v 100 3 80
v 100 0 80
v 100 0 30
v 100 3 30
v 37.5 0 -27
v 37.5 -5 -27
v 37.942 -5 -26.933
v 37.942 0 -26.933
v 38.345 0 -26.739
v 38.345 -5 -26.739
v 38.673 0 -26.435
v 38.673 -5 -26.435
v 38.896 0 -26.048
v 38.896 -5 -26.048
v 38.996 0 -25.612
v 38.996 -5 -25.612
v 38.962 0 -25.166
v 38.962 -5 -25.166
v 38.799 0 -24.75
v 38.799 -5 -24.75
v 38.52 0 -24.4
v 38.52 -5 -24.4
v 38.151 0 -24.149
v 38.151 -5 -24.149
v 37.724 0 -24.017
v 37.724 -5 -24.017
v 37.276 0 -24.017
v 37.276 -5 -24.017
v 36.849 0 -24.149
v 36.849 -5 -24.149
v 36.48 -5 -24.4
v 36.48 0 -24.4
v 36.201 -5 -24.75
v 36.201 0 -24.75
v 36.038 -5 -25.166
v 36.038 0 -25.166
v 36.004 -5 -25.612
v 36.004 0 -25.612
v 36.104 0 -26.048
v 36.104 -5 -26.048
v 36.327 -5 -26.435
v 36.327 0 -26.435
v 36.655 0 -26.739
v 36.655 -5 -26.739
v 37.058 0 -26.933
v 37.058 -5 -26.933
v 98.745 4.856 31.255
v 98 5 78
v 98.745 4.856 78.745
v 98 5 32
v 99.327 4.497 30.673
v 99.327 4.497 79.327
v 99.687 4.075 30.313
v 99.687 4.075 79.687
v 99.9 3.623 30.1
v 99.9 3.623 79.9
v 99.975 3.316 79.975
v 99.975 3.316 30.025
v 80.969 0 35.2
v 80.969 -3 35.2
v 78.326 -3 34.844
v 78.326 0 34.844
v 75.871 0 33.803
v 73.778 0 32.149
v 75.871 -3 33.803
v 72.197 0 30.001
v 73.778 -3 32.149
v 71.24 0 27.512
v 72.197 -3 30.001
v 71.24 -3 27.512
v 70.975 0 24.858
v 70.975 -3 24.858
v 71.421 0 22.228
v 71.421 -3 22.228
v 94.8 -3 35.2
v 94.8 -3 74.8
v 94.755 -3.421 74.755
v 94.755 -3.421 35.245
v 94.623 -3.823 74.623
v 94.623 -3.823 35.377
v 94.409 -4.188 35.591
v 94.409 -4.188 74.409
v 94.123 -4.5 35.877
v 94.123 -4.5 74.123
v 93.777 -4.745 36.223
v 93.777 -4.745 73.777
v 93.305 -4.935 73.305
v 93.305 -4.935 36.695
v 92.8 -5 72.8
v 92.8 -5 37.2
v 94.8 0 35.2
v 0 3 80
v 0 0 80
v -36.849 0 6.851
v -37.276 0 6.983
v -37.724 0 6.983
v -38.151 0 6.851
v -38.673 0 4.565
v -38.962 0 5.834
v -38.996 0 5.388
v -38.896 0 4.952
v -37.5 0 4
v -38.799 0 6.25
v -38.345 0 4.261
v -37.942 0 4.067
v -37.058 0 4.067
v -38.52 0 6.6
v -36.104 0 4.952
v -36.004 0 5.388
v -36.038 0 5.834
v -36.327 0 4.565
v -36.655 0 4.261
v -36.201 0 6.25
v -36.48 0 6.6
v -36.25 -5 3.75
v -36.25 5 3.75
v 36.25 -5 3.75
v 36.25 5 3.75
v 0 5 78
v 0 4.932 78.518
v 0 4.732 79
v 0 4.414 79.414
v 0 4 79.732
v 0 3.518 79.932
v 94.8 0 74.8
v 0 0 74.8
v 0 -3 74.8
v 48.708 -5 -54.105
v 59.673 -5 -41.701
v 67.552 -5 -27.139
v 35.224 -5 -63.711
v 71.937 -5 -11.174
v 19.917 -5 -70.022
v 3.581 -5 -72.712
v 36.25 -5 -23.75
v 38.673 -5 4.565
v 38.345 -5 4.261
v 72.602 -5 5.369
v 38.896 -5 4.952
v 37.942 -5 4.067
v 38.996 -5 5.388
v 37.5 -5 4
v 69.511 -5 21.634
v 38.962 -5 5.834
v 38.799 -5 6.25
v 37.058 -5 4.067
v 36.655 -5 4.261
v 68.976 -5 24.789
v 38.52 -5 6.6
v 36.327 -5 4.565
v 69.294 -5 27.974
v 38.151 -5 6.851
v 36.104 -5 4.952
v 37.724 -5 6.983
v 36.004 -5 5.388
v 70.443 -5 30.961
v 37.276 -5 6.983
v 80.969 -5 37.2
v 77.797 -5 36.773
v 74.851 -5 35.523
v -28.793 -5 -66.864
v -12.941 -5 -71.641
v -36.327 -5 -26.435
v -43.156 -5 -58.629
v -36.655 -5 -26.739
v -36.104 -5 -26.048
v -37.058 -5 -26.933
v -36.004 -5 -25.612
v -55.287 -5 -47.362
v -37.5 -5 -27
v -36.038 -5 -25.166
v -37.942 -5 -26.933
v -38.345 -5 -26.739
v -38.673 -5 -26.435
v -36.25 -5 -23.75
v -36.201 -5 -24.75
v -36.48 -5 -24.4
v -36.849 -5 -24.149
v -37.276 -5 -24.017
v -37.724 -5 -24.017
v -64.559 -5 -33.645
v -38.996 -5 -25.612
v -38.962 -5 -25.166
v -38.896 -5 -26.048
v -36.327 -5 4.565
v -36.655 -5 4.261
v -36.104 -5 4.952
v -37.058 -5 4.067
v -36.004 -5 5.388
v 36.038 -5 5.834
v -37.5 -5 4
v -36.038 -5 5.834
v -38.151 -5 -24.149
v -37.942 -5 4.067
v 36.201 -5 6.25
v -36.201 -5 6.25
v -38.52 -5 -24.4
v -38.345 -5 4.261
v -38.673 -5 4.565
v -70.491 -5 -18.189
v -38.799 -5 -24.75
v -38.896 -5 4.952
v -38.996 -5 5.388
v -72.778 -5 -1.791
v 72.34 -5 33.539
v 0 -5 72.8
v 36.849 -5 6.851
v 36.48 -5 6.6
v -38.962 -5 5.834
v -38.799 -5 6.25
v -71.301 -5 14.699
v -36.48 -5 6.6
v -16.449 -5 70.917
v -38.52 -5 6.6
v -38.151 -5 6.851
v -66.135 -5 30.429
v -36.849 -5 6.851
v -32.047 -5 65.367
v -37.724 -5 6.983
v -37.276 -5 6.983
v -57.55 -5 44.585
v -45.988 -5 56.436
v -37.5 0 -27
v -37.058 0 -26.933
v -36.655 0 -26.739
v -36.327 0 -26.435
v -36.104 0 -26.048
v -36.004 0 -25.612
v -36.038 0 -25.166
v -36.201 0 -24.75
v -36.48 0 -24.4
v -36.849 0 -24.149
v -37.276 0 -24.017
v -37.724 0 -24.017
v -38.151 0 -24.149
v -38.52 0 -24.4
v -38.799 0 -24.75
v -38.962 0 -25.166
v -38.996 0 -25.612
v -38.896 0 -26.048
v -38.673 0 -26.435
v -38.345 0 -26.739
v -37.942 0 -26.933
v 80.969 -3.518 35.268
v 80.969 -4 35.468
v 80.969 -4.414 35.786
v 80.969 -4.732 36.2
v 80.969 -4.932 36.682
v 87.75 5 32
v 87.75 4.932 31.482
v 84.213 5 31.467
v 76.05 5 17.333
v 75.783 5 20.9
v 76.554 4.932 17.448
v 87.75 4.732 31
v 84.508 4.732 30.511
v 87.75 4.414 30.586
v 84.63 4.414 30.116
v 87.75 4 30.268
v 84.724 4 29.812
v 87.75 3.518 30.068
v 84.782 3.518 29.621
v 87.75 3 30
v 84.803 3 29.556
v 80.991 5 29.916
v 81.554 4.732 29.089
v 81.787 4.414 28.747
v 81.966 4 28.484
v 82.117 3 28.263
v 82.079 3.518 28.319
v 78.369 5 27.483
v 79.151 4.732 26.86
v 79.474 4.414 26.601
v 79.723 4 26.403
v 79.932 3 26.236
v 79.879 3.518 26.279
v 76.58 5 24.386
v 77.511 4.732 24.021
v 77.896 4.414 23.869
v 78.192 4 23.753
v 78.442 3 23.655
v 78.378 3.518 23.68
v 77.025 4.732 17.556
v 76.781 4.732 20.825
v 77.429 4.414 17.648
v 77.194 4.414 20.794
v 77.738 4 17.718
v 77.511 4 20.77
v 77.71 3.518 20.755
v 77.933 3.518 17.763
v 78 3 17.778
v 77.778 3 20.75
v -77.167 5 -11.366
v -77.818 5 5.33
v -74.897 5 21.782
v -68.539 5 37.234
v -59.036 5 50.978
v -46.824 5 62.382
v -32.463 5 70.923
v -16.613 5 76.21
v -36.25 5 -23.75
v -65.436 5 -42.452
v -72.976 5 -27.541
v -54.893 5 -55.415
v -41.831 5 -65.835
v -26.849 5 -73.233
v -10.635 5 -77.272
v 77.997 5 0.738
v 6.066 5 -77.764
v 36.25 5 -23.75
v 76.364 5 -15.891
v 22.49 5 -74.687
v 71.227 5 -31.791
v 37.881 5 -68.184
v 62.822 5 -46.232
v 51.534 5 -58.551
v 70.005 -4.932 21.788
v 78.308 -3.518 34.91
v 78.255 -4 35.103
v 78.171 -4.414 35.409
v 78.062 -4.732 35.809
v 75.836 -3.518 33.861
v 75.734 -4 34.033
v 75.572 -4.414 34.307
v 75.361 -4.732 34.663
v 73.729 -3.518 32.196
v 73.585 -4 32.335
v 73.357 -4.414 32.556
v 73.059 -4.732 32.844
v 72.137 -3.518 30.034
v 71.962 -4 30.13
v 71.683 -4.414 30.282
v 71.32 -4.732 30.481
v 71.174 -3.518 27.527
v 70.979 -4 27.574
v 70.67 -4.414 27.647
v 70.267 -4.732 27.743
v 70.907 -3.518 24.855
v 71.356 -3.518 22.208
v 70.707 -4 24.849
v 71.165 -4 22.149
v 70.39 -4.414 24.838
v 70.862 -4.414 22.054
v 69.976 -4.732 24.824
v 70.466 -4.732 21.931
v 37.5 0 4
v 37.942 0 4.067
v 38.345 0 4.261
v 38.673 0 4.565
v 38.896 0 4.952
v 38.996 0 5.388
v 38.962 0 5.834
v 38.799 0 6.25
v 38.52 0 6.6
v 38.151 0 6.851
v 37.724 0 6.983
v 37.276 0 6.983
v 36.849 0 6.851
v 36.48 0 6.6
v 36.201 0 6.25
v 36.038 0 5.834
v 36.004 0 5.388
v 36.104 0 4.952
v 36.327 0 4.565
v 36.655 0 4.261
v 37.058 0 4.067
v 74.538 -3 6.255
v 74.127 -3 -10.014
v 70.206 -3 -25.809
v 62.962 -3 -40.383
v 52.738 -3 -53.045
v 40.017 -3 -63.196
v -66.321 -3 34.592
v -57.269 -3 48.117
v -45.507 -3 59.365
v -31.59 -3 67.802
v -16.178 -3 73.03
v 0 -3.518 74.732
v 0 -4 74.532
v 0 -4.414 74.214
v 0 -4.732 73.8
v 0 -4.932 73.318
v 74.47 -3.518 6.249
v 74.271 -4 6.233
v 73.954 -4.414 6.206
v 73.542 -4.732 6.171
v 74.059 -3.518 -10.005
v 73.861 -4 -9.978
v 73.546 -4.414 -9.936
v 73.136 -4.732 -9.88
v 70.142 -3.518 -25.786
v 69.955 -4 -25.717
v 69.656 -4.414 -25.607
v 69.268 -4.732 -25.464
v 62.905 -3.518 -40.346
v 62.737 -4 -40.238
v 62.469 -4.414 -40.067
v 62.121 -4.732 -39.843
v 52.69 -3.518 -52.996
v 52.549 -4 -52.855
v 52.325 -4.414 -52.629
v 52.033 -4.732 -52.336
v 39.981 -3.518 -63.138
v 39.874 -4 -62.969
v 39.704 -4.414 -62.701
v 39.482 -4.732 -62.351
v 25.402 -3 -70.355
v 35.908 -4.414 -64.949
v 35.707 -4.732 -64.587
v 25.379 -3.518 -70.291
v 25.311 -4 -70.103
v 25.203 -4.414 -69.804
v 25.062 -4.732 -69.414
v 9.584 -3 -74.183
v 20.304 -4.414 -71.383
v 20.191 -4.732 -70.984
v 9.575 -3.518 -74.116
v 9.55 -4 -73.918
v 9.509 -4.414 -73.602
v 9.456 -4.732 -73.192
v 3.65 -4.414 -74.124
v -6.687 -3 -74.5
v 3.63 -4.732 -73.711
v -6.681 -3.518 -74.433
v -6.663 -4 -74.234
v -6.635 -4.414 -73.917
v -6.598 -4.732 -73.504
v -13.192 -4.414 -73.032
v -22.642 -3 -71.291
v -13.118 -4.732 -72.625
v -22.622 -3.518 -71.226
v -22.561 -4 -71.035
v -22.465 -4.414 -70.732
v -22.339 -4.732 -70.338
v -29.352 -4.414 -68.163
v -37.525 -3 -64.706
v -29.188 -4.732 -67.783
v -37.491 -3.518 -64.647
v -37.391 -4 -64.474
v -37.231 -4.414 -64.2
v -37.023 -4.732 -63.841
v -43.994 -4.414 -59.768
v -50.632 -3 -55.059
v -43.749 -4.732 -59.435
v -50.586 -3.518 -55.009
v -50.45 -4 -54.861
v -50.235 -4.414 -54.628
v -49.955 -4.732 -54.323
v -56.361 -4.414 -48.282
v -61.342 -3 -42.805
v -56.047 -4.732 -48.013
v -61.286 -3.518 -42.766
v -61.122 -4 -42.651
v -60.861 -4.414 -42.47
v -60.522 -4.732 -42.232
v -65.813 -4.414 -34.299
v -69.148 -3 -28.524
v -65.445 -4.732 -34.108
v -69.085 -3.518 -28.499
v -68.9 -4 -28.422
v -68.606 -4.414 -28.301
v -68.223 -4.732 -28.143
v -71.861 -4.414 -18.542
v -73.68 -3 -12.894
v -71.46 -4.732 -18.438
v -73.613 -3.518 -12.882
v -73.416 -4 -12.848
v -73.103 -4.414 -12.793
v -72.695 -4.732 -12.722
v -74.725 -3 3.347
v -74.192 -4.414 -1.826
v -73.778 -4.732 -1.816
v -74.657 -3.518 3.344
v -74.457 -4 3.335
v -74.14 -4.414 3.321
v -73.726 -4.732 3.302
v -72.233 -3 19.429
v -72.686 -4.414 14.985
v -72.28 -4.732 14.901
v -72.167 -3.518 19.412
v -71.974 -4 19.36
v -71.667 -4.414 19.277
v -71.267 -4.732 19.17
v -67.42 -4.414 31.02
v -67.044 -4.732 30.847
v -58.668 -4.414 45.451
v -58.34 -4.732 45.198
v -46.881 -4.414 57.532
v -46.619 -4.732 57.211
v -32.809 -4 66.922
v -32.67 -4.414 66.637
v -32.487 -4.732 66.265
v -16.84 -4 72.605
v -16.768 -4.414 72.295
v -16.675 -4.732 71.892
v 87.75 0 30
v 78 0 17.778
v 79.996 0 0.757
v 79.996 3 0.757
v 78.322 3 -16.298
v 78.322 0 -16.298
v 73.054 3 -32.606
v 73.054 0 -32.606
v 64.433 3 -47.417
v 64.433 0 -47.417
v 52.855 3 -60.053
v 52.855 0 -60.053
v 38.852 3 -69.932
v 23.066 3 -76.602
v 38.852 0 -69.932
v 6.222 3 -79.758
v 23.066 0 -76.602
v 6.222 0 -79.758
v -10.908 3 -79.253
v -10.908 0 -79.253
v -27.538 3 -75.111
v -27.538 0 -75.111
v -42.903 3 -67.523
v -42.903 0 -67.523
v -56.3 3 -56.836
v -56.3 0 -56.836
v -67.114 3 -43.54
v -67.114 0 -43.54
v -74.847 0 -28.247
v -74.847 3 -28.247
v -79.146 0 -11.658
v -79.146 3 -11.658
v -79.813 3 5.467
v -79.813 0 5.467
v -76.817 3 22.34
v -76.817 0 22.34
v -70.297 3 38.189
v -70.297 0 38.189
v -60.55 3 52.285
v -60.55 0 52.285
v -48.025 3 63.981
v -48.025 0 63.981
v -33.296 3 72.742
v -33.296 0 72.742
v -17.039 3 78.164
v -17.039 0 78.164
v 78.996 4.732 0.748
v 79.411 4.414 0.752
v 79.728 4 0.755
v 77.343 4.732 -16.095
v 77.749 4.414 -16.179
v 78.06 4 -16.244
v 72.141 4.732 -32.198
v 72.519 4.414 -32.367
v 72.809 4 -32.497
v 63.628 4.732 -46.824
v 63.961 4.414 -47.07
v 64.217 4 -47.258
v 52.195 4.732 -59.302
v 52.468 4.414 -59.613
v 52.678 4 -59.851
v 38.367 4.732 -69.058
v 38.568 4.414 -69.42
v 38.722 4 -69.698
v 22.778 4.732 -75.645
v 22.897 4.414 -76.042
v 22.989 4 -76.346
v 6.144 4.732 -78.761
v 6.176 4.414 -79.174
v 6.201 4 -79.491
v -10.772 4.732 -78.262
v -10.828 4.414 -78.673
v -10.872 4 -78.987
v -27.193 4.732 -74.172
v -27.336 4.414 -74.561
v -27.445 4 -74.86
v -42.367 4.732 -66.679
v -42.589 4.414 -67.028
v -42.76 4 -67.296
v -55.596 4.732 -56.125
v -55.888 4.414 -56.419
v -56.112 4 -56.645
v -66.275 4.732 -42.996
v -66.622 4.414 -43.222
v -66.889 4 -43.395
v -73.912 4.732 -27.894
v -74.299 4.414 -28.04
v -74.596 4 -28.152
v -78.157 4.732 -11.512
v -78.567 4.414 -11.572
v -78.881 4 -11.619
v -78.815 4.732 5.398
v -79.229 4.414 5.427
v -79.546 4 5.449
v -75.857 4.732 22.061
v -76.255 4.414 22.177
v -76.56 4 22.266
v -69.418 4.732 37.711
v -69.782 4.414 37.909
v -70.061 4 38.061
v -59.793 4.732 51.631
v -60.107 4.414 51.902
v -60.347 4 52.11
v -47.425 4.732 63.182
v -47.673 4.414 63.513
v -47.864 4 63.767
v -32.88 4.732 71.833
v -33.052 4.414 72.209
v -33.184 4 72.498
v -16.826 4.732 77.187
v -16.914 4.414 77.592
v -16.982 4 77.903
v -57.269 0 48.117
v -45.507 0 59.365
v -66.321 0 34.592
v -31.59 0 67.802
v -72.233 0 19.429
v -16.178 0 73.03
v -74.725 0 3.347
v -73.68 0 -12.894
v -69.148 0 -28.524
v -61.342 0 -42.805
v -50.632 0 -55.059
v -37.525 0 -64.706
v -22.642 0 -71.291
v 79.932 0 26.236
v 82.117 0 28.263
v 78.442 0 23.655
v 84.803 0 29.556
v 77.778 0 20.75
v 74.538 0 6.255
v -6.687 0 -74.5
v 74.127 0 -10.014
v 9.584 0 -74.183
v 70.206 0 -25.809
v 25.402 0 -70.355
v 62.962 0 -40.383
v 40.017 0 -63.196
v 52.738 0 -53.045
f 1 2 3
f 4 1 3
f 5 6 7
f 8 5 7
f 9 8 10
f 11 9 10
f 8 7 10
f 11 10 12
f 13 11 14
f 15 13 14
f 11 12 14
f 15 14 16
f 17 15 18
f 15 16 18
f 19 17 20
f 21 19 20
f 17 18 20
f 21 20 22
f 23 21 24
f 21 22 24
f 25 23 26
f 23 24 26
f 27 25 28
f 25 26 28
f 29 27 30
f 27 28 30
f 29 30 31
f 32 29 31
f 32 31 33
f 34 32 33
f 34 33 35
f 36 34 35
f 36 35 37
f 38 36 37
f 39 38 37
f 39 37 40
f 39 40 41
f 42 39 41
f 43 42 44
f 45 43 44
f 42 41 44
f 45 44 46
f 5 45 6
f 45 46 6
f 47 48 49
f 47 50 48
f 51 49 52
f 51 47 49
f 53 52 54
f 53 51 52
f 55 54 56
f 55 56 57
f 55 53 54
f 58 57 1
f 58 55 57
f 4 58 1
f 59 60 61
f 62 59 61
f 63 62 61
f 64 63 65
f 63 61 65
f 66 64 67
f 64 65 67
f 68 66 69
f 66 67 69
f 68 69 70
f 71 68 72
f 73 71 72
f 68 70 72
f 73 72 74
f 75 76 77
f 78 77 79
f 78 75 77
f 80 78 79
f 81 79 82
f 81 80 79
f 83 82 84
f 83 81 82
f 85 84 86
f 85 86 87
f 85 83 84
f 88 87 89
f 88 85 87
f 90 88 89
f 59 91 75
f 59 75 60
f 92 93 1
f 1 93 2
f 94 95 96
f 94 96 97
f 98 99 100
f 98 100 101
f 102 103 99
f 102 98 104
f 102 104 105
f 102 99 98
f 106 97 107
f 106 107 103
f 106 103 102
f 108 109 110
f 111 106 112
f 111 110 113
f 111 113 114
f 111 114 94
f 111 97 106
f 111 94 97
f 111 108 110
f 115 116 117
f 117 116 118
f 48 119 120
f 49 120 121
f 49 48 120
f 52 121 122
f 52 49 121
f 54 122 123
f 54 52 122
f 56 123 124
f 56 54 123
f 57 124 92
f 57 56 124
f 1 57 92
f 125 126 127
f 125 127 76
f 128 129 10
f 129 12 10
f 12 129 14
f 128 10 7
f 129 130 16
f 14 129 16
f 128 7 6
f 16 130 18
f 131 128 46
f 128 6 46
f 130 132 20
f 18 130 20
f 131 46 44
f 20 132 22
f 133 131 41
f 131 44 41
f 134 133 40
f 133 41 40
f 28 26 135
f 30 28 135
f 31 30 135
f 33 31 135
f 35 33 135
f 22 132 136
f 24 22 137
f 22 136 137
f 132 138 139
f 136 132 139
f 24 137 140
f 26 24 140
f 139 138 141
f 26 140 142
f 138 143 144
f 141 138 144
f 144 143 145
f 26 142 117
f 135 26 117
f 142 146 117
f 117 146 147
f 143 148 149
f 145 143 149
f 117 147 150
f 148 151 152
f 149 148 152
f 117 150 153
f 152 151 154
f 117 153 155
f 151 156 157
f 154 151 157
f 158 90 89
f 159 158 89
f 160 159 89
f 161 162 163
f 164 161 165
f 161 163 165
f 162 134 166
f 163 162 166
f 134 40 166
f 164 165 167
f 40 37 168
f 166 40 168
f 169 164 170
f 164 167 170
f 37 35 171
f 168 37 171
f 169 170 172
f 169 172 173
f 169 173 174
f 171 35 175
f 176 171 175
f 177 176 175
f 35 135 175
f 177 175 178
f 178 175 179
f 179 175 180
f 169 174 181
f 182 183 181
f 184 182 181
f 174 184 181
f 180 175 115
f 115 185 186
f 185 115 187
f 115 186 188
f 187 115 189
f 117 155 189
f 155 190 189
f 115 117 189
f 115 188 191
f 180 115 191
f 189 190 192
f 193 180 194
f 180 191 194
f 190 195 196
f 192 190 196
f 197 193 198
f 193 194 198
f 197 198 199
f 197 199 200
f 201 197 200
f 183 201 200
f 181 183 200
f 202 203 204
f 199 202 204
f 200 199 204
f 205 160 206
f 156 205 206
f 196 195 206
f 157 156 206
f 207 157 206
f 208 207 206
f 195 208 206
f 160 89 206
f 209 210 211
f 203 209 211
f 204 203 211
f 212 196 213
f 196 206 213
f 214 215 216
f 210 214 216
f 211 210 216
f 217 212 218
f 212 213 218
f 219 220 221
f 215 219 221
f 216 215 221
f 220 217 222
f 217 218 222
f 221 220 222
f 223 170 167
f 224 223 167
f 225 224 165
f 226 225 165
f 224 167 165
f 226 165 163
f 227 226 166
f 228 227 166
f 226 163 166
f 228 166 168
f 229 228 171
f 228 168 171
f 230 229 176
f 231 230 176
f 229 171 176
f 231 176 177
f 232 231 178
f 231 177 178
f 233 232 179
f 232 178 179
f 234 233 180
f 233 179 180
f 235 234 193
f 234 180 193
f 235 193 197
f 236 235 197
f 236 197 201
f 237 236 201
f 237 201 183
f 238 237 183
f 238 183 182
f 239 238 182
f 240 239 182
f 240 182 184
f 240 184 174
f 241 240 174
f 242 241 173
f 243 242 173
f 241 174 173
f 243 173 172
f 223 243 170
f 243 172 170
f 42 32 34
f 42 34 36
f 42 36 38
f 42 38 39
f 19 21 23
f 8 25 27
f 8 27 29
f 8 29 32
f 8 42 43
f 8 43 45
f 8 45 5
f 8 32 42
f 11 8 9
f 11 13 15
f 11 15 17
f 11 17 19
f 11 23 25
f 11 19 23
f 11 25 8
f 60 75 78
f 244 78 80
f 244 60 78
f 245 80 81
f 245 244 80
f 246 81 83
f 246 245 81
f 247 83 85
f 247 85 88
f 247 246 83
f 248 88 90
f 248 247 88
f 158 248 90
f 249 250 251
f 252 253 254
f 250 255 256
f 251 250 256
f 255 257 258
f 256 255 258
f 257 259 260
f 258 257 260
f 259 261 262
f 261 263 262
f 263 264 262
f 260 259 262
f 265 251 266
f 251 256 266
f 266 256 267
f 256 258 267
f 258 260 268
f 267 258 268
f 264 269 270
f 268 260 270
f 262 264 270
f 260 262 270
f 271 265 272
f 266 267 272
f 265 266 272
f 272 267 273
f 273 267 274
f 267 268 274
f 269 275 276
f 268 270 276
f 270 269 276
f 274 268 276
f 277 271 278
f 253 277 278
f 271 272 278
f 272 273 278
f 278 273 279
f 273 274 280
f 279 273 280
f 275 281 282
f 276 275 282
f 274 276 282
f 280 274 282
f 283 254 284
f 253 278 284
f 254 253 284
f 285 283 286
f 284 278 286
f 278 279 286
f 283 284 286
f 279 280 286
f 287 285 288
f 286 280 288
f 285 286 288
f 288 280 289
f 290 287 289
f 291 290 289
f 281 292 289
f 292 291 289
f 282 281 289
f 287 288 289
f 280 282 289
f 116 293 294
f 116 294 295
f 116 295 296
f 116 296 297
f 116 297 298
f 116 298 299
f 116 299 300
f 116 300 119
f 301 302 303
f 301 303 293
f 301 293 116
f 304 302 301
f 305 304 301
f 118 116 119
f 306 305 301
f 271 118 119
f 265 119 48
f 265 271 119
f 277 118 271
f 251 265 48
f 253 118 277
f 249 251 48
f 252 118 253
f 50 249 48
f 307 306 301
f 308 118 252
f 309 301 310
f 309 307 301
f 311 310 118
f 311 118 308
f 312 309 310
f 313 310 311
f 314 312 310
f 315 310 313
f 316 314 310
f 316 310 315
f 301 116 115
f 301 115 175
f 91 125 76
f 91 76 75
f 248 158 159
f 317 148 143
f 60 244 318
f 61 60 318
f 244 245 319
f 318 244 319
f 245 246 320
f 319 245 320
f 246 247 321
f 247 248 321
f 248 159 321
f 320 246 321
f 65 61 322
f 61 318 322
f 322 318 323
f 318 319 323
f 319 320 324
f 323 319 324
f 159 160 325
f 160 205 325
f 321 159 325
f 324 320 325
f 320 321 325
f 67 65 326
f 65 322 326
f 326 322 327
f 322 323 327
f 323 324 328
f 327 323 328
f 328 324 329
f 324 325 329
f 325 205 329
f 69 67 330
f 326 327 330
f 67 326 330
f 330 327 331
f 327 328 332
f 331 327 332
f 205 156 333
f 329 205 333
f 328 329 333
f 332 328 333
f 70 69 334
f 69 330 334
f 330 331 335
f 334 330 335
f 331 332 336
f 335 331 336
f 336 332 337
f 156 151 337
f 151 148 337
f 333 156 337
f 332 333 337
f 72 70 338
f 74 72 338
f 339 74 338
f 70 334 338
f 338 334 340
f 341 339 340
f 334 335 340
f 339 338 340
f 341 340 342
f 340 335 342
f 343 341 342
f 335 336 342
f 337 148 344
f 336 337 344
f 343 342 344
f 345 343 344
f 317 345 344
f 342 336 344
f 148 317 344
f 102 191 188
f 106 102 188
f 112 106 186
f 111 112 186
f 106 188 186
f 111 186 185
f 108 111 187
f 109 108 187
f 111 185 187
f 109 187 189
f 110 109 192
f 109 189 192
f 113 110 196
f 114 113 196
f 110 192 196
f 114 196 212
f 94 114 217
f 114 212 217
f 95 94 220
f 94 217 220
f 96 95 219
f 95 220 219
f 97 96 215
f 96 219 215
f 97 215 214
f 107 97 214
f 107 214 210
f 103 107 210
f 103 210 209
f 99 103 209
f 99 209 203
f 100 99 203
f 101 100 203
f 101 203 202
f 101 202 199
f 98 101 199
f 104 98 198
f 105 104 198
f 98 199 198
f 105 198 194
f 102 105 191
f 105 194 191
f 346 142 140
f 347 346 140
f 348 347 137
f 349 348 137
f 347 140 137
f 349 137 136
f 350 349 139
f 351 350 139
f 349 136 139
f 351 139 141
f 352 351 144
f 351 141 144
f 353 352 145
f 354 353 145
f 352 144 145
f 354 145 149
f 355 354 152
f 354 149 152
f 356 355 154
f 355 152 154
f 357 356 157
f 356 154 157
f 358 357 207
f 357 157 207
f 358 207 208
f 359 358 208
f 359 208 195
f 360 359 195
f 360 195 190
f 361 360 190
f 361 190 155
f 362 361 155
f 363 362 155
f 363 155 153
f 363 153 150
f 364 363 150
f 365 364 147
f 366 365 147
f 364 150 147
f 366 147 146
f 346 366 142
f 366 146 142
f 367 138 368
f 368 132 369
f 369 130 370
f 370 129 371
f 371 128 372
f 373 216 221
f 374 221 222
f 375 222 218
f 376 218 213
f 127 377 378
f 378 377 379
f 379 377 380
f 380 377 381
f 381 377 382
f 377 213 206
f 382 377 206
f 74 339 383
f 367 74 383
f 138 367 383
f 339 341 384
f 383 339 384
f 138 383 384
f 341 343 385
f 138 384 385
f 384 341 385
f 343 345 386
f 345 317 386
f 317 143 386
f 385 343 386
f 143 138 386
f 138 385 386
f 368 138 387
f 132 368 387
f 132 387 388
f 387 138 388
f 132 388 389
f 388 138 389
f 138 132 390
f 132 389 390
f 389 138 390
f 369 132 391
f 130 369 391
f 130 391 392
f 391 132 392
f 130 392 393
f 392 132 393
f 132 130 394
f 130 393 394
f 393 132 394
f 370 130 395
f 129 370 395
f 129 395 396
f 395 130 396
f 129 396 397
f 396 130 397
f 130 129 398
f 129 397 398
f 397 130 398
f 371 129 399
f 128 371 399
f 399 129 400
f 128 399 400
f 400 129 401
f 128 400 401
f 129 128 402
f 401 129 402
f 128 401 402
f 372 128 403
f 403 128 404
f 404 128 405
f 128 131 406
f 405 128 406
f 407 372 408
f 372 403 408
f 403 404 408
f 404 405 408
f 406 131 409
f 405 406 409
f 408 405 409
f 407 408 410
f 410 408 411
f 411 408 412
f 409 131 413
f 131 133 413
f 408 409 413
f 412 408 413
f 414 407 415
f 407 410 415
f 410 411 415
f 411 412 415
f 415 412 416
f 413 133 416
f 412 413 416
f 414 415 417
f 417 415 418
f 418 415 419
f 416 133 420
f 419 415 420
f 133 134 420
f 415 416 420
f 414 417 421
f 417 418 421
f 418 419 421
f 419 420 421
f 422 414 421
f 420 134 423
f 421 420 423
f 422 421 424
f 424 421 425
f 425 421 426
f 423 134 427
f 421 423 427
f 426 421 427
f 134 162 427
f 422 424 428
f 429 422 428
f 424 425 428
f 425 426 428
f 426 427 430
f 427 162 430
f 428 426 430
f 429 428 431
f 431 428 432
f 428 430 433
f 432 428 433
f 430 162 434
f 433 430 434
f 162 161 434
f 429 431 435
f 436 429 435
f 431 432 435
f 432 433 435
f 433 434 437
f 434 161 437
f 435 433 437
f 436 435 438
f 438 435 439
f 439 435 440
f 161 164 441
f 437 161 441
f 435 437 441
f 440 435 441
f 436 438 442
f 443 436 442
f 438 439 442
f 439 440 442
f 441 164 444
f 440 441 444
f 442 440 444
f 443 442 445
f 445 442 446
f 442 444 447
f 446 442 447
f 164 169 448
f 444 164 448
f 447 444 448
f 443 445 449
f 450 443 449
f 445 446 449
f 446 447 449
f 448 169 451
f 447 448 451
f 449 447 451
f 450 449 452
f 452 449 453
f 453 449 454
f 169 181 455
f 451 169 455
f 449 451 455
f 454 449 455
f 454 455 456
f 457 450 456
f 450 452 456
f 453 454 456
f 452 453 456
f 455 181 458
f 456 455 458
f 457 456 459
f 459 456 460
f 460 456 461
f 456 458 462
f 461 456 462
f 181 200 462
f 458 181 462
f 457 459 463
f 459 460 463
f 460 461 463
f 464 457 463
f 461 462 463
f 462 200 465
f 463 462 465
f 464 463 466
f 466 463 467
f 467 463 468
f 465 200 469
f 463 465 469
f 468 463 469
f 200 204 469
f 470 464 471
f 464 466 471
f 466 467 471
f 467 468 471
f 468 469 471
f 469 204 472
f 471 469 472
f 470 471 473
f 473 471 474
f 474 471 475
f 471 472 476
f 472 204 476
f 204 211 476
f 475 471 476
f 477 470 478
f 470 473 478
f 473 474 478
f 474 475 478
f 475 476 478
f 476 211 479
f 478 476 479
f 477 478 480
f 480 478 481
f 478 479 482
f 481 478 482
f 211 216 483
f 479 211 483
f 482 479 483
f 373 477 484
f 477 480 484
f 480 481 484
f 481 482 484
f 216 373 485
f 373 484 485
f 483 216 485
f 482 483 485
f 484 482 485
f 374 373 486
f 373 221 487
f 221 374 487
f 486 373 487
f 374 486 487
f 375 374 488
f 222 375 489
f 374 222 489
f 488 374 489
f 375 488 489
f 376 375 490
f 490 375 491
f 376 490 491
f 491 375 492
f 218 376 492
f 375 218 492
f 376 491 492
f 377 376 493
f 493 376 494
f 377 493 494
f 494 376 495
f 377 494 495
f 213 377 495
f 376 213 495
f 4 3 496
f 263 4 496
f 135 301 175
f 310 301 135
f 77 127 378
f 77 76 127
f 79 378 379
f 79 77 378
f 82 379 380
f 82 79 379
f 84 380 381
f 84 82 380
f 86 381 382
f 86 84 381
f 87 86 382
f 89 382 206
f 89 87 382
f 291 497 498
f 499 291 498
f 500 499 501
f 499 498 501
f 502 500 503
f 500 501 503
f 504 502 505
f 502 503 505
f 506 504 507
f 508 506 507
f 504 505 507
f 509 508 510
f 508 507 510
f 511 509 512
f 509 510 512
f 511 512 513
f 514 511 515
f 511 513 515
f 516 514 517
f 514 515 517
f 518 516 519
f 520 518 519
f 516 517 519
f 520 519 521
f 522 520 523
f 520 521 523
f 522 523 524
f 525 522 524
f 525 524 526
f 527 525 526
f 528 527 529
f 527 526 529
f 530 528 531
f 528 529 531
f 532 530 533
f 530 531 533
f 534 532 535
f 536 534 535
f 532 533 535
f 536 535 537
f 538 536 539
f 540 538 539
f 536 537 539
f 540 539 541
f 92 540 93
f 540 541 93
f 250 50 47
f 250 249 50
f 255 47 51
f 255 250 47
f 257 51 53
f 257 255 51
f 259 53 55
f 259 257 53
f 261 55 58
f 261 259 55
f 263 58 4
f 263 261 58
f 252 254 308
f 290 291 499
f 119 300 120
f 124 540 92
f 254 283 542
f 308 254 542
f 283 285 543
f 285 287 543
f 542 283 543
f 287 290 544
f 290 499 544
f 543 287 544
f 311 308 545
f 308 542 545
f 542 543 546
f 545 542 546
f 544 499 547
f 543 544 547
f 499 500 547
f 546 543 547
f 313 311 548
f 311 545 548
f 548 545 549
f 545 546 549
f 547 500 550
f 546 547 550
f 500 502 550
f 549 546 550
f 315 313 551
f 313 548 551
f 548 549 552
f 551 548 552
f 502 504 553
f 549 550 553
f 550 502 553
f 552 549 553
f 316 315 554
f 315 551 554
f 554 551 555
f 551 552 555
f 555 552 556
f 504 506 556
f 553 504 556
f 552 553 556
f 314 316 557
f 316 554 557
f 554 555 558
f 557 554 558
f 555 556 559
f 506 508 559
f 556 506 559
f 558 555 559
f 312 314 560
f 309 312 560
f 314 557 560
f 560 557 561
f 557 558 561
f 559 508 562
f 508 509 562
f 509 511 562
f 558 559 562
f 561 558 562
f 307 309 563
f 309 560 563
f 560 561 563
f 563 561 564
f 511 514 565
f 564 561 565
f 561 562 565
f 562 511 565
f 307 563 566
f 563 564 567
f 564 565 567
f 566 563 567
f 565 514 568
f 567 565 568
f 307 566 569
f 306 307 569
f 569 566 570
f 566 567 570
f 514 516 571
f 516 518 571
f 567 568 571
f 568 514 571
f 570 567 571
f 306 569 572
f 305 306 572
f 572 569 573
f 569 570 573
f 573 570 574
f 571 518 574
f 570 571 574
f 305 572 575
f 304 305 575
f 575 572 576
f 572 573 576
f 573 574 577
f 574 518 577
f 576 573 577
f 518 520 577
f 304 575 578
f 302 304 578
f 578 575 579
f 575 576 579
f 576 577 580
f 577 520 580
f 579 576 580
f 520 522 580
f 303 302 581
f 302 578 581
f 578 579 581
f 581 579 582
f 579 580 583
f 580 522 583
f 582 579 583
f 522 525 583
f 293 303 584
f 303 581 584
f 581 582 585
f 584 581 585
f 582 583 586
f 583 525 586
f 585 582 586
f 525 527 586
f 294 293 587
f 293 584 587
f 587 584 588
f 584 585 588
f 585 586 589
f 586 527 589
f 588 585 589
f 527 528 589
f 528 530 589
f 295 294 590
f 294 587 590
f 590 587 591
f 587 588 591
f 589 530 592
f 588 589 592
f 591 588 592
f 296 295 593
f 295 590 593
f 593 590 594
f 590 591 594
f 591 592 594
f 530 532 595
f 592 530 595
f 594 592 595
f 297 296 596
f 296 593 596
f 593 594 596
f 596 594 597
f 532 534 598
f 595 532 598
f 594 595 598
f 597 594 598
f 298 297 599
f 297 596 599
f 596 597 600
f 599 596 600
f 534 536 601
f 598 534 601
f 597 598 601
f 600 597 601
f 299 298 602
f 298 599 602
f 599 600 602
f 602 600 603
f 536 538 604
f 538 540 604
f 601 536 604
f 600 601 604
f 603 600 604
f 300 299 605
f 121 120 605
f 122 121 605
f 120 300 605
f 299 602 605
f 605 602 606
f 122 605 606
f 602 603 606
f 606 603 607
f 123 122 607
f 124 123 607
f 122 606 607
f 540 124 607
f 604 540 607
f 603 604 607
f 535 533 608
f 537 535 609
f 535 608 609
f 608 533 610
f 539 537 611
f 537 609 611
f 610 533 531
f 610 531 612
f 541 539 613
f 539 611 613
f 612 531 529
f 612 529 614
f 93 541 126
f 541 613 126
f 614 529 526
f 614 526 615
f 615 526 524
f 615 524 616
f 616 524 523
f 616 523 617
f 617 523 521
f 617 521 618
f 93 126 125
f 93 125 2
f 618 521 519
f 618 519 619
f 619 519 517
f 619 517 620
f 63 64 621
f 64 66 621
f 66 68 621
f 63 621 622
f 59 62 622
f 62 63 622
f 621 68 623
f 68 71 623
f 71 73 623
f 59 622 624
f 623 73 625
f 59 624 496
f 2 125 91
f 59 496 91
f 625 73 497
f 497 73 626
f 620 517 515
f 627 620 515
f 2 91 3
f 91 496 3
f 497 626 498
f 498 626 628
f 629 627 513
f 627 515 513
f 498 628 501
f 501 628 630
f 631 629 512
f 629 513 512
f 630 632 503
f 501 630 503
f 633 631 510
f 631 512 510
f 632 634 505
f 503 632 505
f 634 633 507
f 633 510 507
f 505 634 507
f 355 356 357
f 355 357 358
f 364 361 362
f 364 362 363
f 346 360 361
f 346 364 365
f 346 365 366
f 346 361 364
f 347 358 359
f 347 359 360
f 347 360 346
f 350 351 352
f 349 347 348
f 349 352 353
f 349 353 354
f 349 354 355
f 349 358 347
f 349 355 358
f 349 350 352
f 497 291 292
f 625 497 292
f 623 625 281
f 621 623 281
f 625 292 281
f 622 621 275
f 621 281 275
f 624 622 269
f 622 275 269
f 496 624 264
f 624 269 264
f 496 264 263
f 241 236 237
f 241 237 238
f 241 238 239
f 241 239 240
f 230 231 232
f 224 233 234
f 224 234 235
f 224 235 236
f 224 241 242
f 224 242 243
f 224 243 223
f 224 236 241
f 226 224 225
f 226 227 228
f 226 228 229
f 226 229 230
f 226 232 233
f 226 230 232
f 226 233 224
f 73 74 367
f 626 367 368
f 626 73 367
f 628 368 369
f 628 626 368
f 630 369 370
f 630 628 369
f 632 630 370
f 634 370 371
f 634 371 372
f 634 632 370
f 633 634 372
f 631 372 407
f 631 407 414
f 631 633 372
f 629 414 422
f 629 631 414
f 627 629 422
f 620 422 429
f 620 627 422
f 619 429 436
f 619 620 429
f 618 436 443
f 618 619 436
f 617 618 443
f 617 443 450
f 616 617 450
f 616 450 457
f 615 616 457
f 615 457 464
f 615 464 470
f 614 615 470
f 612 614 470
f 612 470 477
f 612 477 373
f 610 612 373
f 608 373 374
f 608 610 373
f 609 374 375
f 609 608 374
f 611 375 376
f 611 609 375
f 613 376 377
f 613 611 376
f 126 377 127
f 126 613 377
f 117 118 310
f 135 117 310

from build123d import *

# Parameters (mm, degrees)
BOSS_EXTRUDE1_DEPTH = 5
BOSS_EXTRUDE2_DEPTH = 5
SKETCH3_W           = 72.5
SKETCH3_H           = 27.5
CUT_EXTRUDE1_DEPTH  = 129.452325787
SKETCH4_R           = 1.5
CUT_EXTRUDE2_DEPTH  = 5
FILLET2_R           = 10
FILLET3_R           = 2
FILLET1_R           = 2


with BuildPart() as part:
    # Sketch1 → Boss-Extrude1 (new body)
    with BuildSketch(Plane(origin=(0, 0, 0), x_dir=(1, 0, 0), z_dir=(0, 1, 0))):
        with BuildLine():
            Line((0, -80), (100, -80))
            Line((100, -80), (100, -30))
            Line((100, -30), (74.161984871, -30))
            ThreePointArc((74.161984871, -30), (-44.72135955, 66.332495807), (0, -80))
        make_face()
    extrude(amount=BOSS_EXTRUDE1_DEPTH)

    # Sketch2 → Boss-Extrude2 (add)
    with BuildSketch(Plane.XZ):
        with BuildLine():
            Line((0, 74.8), (94.8, 74.8))
            Line((94.8, 74.8), (94.8, 35.2))
            Line((94.8, 35.2), (66, 35.2))
            ThreePointArc((66, 35.2), (-38.484282506, -64.140470843), (0, 74.8))
        make_face()
    extrude(amount=BOSS_EXTRUDE2_DEPTH)

    # Sketch3 → Cut-Extrude1 (cut, through all)
    with BuildSketch(Plane(origin=(0, 5, 0), x_dir=(1, 0, 0), z_dir=(0, 1, 0))):
        with Locations((0, 10)):
            Rectangle(SKETCH3_W, SKETCH3_H)
    extrude(amount=-CUT_EXTRUDE1_DEPTH, mode=Mode.SUBTRACT)

    # Sketch4 → Cut-Extrude2 (cut)
    with BuildSketch(Plane.XZ.offset(5)):
        with Locations(Location((-37.5, 5.5, 0), (0, 0, 270))):
            Circle(SKETCH4_R)
        with Locations(Location((37.5, 5.5, 0), (0, 0, 270))):
            Circle(SKETCH4_R)
        with Locations(Location((37.5, -25.5, 0), (0, 0, 270))):
            Circle(SKETCH4_R)
        with Locations(Location((-37.5, -25.5, 0), (0, 0, 270))):
            Circle(SKETCH4_R)
    extrude(amount=-CUT_EXTRUDE2_DEPTH, mode=Mode.SUBTRACT)

    # Fillet2
    fillet2_edges = [part.edges().sort_by_distance(p)[0] for p in [
        (66, -2.5, 35.2),
        (74.161984871, 2.5, 30),
    ]]
    fillet(fillet2_edges, radius=FILLET2_R)

    # Fillet3
    fillet3_edges = [part.edges().sort_by_distance(p)[0] for p in [
        (100, 5, 55),
        (93.874821937, 5, 30),
        (-49.888765157, 5, -62.538876798),
        (79.932284274, 5, 26.236095645),
        (50, 5, 80),
    ]]
    fillet(fillet3_edges, radius=FILLET3_R)

    # Fillet1
    fillet1_edges = [part.edges().sort_by_distance(p)[0] for p in [
        (-44.341645317, -5, -60.240007392),
        (94.8, -5, 55),
        (47.4, -5, 74.8),
        (87.88456496, -5, 35.2),
        (72.915652996, -5, 31.128027449),
    ]]
    fillet(fillet1_edges, radius=FILLET1_R)


solid = part.part
